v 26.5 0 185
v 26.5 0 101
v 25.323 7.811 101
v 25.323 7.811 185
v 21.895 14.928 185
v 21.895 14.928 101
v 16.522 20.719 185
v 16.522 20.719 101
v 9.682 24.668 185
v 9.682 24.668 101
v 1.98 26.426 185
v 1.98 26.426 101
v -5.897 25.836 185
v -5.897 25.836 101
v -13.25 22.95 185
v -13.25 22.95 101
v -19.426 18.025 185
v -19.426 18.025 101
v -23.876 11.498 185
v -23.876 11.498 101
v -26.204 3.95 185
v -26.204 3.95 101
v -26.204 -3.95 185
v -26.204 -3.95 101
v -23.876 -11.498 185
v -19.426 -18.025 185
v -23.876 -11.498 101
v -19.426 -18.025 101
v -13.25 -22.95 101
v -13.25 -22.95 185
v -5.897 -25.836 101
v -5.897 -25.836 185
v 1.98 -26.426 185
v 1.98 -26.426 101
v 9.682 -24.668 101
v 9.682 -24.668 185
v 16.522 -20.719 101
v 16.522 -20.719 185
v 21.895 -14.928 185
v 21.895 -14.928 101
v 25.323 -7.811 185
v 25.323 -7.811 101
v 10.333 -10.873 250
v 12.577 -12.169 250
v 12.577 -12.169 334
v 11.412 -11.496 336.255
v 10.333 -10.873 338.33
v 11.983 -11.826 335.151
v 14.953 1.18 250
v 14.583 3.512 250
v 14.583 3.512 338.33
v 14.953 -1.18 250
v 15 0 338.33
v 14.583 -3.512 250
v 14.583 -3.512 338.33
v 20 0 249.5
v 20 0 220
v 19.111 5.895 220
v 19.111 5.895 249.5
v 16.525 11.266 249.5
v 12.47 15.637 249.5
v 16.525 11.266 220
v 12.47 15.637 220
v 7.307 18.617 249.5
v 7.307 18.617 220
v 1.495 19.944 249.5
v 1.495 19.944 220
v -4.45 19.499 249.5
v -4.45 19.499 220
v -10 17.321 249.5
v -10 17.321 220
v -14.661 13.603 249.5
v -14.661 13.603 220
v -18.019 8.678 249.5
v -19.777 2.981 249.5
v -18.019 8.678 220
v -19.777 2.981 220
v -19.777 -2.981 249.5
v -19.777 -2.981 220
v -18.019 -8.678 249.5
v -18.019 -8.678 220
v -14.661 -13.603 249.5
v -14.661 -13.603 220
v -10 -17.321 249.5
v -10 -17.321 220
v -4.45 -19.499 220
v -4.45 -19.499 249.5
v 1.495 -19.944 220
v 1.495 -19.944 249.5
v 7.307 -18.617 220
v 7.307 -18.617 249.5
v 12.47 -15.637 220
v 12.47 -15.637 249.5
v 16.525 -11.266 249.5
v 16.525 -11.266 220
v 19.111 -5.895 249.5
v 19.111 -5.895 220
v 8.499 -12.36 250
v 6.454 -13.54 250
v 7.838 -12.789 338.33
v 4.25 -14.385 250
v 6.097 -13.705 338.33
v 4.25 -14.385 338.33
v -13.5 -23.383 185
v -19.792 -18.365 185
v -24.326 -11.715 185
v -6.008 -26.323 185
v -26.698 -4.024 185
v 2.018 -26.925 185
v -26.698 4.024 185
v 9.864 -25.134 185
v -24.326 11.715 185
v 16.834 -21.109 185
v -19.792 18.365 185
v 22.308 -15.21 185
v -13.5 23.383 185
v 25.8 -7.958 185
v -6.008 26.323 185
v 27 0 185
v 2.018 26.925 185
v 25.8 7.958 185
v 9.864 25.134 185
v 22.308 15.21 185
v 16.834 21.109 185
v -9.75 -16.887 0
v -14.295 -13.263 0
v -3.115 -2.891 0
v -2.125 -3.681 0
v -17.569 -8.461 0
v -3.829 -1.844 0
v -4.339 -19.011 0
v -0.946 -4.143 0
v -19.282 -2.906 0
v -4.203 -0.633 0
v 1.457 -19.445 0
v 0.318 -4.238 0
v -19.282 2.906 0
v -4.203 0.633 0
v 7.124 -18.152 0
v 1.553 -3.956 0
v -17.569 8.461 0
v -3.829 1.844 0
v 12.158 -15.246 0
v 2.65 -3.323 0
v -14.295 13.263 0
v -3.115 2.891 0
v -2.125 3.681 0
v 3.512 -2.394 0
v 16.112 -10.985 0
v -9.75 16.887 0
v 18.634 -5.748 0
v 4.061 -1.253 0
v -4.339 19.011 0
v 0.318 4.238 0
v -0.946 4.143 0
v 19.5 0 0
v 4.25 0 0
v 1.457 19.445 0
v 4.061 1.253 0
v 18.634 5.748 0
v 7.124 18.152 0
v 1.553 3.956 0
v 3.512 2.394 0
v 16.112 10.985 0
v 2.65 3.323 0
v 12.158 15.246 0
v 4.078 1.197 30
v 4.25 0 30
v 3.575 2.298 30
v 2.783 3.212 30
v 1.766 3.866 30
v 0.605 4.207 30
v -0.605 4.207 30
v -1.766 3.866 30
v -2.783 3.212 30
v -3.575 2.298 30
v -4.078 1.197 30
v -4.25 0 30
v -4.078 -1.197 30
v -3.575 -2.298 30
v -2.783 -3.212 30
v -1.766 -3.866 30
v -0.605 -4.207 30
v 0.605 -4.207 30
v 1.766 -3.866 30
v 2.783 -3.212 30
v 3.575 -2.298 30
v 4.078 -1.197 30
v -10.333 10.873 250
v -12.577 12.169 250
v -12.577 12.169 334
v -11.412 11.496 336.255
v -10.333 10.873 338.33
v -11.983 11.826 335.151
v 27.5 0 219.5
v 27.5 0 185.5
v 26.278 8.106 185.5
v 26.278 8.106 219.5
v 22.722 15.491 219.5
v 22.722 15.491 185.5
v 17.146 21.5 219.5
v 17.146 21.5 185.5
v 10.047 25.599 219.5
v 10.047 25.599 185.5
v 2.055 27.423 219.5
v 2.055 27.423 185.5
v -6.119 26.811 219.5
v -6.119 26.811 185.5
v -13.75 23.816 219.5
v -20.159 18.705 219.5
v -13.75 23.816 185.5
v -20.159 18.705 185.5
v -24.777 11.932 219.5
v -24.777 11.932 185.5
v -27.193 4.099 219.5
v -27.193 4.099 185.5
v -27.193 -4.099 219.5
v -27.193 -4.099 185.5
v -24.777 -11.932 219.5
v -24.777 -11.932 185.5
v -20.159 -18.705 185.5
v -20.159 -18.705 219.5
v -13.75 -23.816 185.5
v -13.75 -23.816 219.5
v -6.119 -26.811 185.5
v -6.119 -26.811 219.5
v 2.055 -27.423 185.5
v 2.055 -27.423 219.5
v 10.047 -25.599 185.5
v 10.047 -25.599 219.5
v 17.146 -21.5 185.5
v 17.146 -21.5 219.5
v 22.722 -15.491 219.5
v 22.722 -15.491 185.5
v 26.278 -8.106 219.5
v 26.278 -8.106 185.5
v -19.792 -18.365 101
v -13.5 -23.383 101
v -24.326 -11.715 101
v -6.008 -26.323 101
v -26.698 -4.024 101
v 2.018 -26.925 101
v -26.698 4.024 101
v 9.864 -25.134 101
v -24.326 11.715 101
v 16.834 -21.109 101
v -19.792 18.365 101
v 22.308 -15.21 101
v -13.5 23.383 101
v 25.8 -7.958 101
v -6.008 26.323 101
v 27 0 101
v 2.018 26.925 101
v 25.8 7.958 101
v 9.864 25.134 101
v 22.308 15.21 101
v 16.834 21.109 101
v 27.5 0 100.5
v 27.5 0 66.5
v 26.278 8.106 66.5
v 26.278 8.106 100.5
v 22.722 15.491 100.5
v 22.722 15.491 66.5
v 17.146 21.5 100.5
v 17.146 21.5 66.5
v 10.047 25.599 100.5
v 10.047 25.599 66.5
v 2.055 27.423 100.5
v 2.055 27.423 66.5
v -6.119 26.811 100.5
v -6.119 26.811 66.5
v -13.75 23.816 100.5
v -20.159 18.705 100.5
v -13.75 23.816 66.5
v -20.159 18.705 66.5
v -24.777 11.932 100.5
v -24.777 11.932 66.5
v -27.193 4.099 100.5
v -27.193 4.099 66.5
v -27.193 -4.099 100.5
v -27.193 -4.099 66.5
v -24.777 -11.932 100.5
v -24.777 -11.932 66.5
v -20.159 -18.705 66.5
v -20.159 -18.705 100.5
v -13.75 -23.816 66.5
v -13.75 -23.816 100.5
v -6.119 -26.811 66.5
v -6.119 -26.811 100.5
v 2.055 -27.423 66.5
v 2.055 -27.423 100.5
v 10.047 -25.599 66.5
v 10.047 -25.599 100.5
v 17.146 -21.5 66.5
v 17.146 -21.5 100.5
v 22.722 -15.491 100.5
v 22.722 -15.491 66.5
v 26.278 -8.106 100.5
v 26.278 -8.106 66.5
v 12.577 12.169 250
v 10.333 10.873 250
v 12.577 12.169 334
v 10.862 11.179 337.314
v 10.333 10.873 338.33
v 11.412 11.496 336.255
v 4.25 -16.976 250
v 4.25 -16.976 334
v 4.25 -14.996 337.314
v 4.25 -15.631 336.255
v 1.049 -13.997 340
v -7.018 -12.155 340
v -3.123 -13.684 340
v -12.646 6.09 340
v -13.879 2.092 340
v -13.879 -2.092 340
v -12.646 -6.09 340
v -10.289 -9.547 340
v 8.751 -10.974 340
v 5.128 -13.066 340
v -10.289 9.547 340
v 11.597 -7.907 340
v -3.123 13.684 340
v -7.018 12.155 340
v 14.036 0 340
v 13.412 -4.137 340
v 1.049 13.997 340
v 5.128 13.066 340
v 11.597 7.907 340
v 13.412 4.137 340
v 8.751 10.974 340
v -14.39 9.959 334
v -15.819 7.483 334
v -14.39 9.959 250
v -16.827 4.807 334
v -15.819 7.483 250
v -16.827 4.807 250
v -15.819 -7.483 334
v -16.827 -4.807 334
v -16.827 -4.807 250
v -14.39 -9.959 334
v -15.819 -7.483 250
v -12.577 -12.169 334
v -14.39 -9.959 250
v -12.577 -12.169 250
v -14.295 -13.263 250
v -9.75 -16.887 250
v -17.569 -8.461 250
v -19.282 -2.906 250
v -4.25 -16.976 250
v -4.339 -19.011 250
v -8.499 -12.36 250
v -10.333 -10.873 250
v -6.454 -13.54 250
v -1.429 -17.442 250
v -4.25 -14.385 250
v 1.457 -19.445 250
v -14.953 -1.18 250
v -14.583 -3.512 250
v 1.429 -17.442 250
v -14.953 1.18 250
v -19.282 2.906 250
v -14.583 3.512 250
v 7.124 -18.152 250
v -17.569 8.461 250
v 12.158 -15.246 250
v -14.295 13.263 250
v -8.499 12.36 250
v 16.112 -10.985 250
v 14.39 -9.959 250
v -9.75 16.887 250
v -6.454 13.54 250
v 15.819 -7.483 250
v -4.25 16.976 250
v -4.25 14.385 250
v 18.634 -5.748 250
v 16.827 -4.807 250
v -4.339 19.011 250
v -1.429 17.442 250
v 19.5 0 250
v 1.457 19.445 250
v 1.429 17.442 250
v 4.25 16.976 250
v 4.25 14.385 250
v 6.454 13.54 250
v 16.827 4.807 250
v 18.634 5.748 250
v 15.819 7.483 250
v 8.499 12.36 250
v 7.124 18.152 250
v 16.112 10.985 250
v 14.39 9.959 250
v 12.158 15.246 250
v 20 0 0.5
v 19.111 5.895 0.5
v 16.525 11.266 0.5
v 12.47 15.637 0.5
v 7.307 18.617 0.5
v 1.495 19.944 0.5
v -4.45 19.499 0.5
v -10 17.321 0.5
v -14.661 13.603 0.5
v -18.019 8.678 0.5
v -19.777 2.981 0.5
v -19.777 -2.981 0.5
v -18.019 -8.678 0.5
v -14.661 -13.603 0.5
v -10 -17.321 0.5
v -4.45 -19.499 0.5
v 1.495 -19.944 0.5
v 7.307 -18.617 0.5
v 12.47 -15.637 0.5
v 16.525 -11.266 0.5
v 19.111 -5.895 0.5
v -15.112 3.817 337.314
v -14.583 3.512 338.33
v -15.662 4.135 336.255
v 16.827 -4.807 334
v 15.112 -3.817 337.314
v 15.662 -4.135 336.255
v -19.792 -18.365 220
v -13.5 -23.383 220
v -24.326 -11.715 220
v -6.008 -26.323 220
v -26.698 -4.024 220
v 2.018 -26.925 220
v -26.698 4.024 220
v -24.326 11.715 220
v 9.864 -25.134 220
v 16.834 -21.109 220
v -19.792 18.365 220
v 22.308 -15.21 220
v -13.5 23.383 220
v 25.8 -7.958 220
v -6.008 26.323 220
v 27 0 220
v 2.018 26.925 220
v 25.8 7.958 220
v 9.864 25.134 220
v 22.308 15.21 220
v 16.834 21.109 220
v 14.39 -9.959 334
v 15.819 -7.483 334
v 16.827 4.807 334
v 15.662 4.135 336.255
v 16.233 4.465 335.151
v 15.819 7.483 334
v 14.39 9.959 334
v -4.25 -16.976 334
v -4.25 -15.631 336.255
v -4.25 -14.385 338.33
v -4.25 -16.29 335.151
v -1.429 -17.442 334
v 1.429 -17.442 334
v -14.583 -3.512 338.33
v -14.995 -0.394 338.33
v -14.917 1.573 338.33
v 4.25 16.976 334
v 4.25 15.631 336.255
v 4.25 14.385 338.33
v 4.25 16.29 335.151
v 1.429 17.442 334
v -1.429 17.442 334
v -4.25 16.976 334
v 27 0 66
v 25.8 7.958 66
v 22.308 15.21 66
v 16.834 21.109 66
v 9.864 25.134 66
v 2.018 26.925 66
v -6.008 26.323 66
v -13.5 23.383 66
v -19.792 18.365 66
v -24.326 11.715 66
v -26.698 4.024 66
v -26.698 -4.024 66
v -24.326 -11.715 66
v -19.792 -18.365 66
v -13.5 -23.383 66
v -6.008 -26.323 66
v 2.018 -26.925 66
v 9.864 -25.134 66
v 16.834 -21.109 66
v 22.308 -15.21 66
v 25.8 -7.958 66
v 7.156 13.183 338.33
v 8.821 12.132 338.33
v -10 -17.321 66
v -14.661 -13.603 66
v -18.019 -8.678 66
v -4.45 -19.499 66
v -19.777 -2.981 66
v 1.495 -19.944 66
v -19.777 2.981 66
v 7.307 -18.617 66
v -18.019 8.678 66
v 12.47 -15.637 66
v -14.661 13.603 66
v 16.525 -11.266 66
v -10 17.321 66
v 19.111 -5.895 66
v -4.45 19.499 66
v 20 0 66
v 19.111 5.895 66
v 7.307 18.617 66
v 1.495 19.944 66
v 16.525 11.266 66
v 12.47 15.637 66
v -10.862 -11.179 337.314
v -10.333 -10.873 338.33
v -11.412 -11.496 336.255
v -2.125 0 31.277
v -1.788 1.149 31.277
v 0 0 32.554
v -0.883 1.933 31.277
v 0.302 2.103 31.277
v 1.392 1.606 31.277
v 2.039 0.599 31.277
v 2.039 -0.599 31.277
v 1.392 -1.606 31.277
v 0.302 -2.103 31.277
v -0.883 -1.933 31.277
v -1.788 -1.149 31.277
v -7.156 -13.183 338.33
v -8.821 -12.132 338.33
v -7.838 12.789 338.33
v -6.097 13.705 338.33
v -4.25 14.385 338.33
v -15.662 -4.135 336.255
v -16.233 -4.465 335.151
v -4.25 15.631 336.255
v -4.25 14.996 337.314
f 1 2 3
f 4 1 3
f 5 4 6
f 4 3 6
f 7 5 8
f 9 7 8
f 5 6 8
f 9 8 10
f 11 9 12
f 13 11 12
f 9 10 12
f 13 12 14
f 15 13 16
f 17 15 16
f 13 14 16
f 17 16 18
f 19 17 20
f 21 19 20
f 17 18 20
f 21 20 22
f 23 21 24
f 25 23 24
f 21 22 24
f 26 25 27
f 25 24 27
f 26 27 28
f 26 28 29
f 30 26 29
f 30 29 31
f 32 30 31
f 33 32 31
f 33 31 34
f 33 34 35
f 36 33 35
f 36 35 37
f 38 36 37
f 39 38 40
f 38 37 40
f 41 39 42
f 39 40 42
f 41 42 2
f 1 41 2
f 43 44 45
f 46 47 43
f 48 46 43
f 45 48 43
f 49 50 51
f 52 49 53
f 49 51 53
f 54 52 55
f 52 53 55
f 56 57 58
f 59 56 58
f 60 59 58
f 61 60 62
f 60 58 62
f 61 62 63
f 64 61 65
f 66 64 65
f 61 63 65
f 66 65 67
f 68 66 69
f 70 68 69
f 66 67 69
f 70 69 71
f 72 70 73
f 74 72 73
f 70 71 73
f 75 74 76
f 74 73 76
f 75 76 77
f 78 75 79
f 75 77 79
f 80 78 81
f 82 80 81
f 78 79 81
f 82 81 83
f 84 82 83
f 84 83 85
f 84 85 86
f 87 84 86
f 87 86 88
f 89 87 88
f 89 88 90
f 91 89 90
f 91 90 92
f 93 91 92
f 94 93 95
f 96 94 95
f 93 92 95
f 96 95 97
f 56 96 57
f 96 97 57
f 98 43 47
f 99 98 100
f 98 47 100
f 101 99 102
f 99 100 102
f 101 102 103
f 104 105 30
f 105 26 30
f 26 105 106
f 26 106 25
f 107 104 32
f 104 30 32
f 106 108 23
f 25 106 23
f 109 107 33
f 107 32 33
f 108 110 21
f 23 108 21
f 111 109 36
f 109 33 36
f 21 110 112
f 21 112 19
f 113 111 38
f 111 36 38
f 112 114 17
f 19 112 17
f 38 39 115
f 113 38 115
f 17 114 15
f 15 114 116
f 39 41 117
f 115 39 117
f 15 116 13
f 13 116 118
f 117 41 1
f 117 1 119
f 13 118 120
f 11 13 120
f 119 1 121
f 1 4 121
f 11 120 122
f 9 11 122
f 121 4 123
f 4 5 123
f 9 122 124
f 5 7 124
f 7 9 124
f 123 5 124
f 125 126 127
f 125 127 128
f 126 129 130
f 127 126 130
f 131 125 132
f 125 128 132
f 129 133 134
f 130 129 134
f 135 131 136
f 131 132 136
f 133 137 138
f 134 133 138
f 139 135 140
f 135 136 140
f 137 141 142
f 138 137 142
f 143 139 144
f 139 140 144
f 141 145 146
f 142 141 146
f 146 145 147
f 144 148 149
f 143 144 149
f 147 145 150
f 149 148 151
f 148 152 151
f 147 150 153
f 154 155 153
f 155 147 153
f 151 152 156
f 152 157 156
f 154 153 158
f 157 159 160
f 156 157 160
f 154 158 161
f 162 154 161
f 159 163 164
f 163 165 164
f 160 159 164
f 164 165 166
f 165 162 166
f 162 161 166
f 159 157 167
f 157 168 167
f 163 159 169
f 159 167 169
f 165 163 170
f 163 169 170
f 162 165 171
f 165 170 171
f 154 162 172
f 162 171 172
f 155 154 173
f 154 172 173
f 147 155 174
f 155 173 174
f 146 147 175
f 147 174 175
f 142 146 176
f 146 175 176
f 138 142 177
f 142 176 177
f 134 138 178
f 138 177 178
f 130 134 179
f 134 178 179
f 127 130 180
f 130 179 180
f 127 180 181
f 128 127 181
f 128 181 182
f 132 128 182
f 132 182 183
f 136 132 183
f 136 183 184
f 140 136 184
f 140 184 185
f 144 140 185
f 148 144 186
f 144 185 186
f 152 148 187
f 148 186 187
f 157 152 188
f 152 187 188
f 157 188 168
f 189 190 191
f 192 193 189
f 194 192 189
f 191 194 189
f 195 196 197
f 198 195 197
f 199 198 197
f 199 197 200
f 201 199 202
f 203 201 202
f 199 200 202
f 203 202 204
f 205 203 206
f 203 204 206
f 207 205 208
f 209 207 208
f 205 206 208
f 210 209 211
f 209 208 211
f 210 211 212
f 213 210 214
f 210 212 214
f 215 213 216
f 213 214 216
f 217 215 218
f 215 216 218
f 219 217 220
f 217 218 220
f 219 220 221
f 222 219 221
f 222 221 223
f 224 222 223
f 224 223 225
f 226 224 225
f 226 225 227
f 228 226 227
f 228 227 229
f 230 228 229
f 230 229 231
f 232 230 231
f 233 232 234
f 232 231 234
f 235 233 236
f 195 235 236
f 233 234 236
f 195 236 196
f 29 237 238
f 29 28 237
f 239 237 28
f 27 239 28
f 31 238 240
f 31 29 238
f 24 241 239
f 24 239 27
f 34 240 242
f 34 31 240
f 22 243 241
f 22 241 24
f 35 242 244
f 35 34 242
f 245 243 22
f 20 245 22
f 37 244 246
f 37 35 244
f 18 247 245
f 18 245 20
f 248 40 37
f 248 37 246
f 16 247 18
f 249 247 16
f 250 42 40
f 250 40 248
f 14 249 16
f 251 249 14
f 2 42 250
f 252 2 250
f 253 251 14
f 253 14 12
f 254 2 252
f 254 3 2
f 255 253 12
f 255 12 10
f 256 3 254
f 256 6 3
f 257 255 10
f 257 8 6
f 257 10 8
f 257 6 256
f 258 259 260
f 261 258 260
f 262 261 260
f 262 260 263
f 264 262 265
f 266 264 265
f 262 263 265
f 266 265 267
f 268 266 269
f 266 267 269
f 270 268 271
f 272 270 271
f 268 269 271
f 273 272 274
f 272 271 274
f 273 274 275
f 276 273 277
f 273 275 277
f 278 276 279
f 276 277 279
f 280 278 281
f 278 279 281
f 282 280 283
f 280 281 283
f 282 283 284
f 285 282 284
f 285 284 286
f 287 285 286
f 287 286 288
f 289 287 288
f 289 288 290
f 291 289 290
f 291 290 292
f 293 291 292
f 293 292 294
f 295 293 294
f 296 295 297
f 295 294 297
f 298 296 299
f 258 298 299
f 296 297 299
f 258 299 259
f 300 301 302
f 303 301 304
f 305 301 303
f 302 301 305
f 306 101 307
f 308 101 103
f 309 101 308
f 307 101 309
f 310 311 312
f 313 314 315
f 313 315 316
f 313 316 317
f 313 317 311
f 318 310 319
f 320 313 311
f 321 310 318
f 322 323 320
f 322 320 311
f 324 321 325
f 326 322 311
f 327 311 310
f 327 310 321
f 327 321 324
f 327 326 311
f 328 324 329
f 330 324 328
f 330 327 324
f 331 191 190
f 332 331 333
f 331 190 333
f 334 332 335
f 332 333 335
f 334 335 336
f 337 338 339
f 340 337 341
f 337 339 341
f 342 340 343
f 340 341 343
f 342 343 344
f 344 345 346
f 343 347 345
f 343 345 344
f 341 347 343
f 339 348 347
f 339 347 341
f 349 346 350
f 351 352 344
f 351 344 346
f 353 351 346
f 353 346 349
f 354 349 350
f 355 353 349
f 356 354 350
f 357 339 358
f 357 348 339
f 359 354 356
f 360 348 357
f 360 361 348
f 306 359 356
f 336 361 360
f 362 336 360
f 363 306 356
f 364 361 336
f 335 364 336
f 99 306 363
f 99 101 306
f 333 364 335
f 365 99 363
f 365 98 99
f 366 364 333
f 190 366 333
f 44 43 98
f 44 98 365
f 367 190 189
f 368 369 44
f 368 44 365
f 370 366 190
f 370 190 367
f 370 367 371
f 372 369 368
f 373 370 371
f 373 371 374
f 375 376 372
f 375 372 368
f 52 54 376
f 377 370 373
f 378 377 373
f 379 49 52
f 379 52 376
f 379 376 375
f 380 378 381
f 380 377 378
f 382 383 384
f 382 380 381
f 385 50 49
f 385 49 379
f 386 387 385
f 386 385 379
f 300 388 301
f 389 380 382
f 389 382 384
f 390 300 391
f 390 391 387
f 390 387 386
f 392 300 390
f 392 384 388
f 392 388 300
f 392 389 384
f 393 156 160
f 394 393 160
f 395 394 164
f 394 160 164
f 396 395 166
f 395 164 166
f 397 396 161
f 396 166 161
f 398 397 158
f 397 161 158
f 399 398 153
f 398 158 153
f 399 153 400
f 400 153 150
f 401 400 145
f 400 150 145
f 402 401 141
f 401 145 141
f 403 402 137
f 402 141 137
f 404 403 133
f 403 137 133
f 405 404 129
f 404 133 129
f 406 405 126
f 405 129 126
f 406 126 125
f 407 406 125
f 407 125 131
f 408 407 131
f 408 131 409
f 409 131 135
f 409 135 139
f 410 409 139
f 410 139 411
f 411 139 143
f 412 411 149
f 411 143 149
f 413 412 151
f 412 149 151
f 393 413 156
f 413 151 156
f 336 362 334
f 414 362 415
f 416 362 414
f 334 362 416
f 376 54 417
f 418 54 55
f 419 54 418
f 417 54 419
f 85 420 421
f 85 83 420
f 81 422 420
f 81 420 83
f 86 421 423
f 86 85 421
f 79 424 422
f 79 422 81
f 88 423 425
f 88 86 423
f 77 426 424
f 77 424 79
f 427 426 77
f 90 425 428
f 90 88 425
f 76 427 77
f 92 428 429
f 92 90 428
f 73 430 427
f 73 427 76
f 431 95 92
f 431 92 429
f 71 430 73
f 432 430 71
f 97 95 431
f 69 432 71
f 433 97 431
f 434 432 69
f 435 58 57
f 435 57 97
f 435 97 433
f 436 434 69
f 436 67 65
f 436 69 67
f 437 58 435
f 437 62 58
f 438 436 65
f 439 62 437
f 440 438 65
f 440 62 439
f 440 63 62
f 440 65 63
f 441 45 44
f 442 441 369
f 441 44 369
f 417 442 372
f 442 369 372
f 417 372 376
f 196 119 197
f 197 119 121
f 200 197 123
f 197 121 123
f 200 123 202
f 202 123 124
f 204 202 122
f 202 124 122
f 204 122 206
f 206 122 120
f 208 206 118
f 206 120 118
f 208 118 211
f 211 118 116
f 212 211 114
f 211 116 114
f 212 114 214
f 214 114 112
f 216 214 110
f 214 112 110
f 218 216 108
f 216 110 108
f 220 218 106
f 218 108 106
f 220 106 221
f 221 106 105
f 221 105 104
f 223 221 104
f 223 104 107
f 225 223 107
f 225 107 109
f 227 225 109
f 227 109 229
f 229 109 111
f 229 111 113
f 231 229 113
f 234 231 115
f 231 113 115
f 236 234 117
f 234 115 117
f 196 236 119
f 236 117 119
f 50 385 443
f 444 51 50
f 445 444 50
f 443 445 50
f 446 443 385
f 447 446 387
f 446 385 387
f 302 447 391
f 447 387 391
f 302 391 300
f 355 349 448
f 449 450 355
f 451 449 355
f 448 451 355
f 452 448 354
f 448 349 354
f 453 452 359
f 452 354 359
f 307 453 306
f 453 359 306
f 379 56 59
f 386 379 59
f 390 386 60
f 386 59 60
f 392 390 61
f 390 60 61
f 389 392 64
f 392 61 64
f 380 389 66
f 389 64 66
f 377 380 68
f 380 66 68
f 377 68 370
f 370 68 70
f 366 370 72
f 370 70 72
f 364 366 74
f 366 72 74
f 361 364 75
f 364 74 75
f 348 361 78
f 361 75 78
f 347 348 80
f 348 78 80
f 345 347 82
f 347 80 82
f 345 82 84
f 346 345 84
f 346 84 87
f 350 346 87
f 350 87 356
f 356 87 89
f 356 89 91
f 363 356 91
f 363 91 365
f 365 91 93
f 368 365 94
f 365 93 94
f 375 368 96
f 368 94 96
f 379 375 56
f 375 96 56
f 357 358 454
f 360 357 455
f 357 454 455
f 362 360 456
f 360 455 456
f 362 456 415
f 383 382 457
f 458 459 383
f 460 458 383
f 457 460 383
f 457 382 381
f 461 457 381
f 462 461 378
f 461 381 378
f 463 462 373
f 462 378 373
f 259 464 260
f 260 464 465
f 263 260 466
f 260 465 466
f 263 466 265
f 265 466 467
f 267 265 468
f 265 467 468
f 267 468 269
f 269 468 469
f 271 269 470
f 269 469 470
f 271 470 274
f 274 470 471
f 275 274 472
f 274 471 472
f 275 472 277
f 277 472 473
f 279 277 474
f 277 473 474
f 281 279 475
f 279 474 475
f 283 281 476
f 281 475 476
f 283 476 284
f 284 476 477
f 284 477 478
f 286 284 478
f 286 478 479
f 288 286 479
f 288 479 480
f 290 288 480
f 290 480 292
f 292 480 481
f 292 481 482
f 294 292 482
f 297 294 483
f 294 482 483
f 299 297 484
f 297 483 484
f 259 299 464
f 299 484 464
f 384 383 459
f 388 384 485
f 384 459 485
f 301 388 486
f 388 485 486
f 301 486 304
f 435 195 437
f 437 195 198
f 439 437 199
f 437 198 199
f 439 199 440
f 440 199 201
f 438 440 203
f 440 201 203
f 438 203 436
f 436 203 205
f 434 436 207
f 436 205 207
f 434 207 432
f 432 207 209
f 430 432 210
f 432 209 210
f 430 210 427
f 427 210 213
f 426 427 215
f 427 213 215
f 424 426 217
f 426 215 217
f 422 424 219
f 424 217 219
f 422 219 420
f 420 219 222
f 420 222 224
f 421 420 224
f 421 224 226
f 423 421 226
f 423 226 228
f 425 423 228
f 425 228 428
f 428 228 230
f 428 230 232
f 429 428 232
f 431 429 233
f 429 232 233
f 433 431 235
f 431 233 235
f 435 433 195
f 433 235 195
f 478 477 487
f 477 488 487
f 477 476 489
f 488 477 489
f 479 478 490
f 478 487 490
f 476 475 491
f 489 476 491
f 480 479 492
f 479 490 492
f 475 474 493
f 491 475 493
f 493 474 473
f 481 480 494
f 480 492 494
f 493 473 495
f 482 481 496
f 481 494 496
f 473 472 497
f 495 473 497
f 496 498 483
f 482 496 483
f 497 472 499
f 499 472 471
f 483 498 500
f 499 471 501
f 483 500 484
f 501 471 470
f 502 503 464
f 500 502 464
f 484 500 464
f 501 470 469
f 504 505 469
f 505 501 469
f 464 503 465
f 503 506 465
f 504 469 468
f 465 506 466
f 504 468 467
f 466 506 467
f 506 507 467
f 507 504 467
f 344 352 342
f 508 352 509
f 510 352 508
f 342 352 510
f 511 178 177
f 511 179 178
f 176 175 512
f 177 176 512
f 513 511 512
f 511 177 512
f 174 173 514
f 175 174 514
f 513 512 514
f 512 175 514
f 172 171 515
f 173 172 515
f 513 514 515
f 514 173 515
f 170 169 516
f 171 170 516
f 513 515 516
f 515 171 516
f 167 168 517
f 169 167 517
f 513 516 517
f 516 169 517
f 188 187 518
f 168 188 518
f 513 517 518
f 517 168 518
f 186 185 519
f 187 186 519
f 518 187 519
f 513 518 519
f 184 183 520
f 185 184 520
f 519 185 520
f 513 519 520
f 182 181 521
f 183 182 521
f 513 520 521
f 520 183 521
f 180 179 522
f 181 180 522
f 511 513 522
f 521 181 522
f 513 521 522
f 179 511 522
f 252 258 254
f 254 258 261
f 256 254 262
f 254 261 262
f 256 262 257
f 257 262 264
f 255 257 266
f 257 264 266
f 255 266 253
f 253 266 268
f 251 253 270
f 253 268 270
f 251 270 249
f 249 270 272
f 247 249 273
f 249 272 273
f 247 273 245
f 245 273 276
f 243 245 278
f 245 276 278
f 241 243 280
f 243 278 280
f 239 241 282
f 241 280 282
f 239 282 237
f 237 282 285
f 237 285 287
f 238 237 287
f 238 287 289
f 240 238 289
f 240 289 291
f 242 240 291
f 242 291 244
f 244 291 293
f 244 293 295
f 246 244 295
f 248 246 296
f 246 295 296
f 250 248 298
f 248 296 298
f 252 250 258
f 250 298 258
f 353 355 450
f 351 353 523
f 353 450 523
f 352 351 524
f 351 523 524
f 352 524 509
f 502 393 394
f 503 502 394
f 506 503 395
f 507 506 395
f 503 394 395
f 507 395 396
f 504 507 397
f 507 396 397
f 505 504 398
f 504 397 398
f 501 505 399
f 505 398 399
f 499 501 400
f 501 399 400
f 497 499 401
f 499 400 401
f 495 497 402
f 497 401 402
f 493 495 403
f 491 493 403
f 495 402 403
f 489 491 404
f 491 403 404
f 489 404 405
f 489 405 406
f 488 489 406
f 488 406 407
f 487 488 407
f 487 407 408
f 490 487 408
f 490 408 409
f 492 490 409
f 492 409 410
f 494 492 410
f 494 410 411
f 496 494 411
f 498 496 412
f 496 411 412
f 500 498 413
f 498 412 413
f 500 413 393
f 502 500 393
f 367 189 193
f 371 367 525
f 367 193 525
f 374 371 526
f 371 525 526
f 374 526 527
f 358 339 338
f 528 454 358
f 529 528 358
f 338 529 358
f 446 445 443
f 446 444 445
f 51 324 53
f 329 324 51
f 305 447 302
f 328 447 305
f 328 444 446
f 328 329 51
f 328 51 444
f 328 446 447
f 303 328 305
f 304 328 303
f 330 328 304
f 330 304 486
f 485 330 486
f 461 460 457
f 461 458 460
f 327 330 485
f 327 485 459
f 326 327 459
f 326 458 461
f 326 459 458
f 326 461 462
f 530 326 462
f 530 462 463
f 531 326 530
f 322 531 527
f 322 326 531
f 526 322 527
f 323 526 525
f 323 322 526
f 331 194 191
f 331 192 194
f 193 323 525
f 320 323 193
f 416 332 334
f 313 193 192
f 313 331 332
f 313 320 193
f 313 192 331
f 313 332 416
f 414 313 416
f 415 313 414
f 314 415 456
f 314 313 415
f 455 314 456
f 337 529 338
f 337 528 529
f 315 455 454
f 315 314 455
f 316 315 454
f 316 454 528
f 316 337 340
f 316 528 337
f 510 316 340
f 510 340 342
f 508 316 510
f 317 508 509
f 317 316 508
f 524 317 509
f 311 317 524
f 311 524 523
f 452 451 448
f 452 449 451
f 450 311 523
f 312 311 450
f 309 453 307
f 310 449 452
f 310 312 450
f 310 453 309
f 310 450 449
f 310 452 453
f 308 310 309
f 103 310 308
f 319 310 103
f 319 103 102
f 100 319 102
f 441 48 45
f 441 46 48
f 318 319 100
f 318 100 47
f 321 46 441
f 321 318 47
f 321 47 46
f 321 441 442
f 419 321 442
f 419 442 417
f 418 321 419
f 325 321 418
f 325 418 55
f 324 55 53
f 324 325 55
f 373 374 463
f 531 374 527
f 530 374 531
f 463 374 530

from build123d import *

# Parameters (mm, degrees)
SKICA1_R                  = 20
P_IDAT_VYSUNUT_M1_DEPTH   = 66
SKICA2_R                  = 27.5
P_IDAT_VYSUNUT_M2_DEPTH   = 35
SKICA3_R                  = 26.5
P_IDAT_VYSUNUT_M3_DEPTH   = 84
SKICA4_R                  = 27.5
P_IDAT_VYSUNUT_M4_DEPTH   = 35
SKICA5_R                  = 20
P_IDAT_VYSUNUT_M5_DEPTH   = 30
SKICA6_R                  = 17.5
P_IDAT_VYSUNUT_M6_DEPTH   = 90
ZKOSEN_3_SIZE             = 6
ZKOSEN_3_SIZE2            = 3.464101615
SKICA9_OUTSIDE_W          = 126.756
SKICA9_OUTSIDE_H          = 126.756
ODEBRAT_VYSUNUT_M16_DEPTH = 90
ZKOSEN_4_SIZE             = 0.5
M10_Z_VIT1_D              = 8.5
M10_Z_VIT1_DEPTH          = 30
M10_Z_VIT1_TIP            = 2.553657631


with BuildPart() as part:
    # Skica1 → Přidat vysunutím1 (new body)
    with BuildSketch(Plane.XY):
        Circle(SKICA1_R)
    extrude(amount=P_IDAT_VYSUNUT_M1_DEPTH)

    # Skica2 → Přidat vysunutím2 (add)
    with BuildSketch(Plane.XY.offset(66)):
        Circle(SKICA2_R)
    extrude(amount=P_IDAT_VYSUNUT_M2_DEPTH)

    # Skica3 → Přidat vysunutím3 (add)
    with BuildSketch(Plane.XY.offset(101)):
        Circle(SKICA3_R)
    extrude(amount=P_IDAT_VYSUNUT_M3_DEPTH)

    # Skica4 → Přidat vysunutím4 (add)
    with BuildSketch(Plane.XY.offset(185)):
        Circle(SKICA4_R)
    extrude(amount=P_IDAT_VYSUNUT_M4_DEPTH)

    # Skica5 → Přidat vysunutím5 (add)
    with BuildSketch(Plane.XY.offset(220)):
        Circle(SKICA5_R)
    extrude(amount=P_IDAT_VYSUNUT_M5_DEPTH)

    # Skica6 → Přidat vysunutím6 (add)
    with BuildSketch(Plane.XY.offset(250)):
        Circle(SKICA6_R)
    extrude(amount=P_IDAT_VYSUNUT_M6_DEPTH)

    # Zkosení3
    zkosen_3_edges = [part.edges().sort_by_distance(p)[0] for p in [
        (-17.5, 0, 340),
    ]]
    zkosen_3_side = [part.faces().sort_by_distance(p)[0] for p in [
        (-17.5, 0, 295),
    ]]
    chamfer(zkosen_3_edges, length=ZKOSEN_3_SIZE, length2=ZKOSEN_3_SIZE2, reference=zkosen_3_side[0])

    # Skica9 outside → Odebrat vysunutím16 (cut)
    with BuildSketch(Plane.XY.offset(340)):
        Rectangle(SKICA9_OUTSIDE_W, SKICA9_OUTSIDE_H)
        with BuildLine():
            Line((-4.25, 14.385322381), (-4.25, 16.976086121))
            ThreePointArc((-4.25, 16.976086121), (0, 17.5), (4.25, 16.976086121))
            Line((4.25, 16.976086121), (4.25, 14.385322381))
            ThreePointArc((4.25, 14.385322381), (7.5, 12.990381057), (10.333054623, 10.873269156))
            Line((10.333054623, 10.873269156), (12.576721838, 12.168651027))
            ThreePointArc((12.576721838, 12.168651027), (15.155444566, 8.75), (16.826721838, 4.807435095))
            Line((16.826721838, 4.807435095), (14.583054623, 3.512053224))
            ThreePointArc((14.583054623, 3.512053224), (15, 0), (14.583054623, -3.512053224))
            Line((14.583054623, -3.512053224), (16.826721838, -4.807435095))
            ThreePointArc((16.826721838, -4.807435095), (15.155444566, -8.75), (12.576721838, -12.168651027))
            Line((12.576721838, -12.168651027), (10.333054623, -10.873269156))
            ThreePointArc((10.333054623, -10.873269156), (7.5, -12.990381057), (4.25, -14.385322381))
            Line((4.25, -14.385322381), (4.25, -16.976086121))
            ThreePointArc((4.25, -16.976086121), (0, -17.5), (-4.25, -16.976086121))
            Line((-4.25, -16.976086121), (-4.25, -14.385322381))
            ThreePointArc((-4.25, -14.385322381), (-7.5, -12.990381057), (-10.333054623, -10.873269156))
            Line((-10.333054623, -10.873269156), (-12.576721838, -12.168651027))
            ThreePointArc((-12.576721838, -12.168651027), (-15.155444566, -8.75), (-16.826721838, -4.807435095))
            Line((-16.826721838, -4.807435095), (-14.583054623, -3.512053224))
            ThreePointArc((-14.583054623, -3.512053224), (-15, 0), (-14.583054623, 3.512053224))
            Line((-14.583054623, 3.512053224), (-16.826721838, 4.807435095))
            ThreePointArc((-16.826721838, 4.807435095), (-15.155444566, 8.75), (-12.576721838, 12.168651027))
            Line((-12.576721838, 12.168651027), (-10.333054623, 10.873269156))
            ThreePointArc((-10.333054623, 10.873269156), (-7.5, 12.990381057), (-4.25, 14.385322381))
        make_face(mode=Mode.SUBTRACT)
    extrude(amount=-ODEBRAT_VYSUNUT_M16_DEPTH, mode=Mode.SUBTRACT)

    # Zkosení4
    zkosen_4_edges = [part.edges().sort_by_distance(p)[0] for p in [
        (-27.5, 0, 185),
        (-27.5, 0, 220),
        (-20, 0, 0),
        (-20, 0, 250),
        (-27.5, 0, 66),
        (-27.5, 0, 101),
    ]]
    chamfer(zkosen_4_edges, length=ZKOSEN_4_SIZE)

    # M10 závit1
    with Locations(Plane(origin=(0, 0, 0), x_dir=(-1, 0, 0), z_dir=(0, 0, -1))):
        with Locations((0, 0)):
            Hole(M10_Z_VIT1_D / 2, depth=M10_Z_VIT1_DEPTH)
            with Locations((0, 0, -(M10_Z_VIT1_DEPTH + M10_Z_VIT1_TIP / 2))):  # 118° drill point
                Cone(0, M10_Z_VIT1_D / 2, M10_Z_VIT1_TIP, mode=Mode.SUBTRACT)


solid = part.part
